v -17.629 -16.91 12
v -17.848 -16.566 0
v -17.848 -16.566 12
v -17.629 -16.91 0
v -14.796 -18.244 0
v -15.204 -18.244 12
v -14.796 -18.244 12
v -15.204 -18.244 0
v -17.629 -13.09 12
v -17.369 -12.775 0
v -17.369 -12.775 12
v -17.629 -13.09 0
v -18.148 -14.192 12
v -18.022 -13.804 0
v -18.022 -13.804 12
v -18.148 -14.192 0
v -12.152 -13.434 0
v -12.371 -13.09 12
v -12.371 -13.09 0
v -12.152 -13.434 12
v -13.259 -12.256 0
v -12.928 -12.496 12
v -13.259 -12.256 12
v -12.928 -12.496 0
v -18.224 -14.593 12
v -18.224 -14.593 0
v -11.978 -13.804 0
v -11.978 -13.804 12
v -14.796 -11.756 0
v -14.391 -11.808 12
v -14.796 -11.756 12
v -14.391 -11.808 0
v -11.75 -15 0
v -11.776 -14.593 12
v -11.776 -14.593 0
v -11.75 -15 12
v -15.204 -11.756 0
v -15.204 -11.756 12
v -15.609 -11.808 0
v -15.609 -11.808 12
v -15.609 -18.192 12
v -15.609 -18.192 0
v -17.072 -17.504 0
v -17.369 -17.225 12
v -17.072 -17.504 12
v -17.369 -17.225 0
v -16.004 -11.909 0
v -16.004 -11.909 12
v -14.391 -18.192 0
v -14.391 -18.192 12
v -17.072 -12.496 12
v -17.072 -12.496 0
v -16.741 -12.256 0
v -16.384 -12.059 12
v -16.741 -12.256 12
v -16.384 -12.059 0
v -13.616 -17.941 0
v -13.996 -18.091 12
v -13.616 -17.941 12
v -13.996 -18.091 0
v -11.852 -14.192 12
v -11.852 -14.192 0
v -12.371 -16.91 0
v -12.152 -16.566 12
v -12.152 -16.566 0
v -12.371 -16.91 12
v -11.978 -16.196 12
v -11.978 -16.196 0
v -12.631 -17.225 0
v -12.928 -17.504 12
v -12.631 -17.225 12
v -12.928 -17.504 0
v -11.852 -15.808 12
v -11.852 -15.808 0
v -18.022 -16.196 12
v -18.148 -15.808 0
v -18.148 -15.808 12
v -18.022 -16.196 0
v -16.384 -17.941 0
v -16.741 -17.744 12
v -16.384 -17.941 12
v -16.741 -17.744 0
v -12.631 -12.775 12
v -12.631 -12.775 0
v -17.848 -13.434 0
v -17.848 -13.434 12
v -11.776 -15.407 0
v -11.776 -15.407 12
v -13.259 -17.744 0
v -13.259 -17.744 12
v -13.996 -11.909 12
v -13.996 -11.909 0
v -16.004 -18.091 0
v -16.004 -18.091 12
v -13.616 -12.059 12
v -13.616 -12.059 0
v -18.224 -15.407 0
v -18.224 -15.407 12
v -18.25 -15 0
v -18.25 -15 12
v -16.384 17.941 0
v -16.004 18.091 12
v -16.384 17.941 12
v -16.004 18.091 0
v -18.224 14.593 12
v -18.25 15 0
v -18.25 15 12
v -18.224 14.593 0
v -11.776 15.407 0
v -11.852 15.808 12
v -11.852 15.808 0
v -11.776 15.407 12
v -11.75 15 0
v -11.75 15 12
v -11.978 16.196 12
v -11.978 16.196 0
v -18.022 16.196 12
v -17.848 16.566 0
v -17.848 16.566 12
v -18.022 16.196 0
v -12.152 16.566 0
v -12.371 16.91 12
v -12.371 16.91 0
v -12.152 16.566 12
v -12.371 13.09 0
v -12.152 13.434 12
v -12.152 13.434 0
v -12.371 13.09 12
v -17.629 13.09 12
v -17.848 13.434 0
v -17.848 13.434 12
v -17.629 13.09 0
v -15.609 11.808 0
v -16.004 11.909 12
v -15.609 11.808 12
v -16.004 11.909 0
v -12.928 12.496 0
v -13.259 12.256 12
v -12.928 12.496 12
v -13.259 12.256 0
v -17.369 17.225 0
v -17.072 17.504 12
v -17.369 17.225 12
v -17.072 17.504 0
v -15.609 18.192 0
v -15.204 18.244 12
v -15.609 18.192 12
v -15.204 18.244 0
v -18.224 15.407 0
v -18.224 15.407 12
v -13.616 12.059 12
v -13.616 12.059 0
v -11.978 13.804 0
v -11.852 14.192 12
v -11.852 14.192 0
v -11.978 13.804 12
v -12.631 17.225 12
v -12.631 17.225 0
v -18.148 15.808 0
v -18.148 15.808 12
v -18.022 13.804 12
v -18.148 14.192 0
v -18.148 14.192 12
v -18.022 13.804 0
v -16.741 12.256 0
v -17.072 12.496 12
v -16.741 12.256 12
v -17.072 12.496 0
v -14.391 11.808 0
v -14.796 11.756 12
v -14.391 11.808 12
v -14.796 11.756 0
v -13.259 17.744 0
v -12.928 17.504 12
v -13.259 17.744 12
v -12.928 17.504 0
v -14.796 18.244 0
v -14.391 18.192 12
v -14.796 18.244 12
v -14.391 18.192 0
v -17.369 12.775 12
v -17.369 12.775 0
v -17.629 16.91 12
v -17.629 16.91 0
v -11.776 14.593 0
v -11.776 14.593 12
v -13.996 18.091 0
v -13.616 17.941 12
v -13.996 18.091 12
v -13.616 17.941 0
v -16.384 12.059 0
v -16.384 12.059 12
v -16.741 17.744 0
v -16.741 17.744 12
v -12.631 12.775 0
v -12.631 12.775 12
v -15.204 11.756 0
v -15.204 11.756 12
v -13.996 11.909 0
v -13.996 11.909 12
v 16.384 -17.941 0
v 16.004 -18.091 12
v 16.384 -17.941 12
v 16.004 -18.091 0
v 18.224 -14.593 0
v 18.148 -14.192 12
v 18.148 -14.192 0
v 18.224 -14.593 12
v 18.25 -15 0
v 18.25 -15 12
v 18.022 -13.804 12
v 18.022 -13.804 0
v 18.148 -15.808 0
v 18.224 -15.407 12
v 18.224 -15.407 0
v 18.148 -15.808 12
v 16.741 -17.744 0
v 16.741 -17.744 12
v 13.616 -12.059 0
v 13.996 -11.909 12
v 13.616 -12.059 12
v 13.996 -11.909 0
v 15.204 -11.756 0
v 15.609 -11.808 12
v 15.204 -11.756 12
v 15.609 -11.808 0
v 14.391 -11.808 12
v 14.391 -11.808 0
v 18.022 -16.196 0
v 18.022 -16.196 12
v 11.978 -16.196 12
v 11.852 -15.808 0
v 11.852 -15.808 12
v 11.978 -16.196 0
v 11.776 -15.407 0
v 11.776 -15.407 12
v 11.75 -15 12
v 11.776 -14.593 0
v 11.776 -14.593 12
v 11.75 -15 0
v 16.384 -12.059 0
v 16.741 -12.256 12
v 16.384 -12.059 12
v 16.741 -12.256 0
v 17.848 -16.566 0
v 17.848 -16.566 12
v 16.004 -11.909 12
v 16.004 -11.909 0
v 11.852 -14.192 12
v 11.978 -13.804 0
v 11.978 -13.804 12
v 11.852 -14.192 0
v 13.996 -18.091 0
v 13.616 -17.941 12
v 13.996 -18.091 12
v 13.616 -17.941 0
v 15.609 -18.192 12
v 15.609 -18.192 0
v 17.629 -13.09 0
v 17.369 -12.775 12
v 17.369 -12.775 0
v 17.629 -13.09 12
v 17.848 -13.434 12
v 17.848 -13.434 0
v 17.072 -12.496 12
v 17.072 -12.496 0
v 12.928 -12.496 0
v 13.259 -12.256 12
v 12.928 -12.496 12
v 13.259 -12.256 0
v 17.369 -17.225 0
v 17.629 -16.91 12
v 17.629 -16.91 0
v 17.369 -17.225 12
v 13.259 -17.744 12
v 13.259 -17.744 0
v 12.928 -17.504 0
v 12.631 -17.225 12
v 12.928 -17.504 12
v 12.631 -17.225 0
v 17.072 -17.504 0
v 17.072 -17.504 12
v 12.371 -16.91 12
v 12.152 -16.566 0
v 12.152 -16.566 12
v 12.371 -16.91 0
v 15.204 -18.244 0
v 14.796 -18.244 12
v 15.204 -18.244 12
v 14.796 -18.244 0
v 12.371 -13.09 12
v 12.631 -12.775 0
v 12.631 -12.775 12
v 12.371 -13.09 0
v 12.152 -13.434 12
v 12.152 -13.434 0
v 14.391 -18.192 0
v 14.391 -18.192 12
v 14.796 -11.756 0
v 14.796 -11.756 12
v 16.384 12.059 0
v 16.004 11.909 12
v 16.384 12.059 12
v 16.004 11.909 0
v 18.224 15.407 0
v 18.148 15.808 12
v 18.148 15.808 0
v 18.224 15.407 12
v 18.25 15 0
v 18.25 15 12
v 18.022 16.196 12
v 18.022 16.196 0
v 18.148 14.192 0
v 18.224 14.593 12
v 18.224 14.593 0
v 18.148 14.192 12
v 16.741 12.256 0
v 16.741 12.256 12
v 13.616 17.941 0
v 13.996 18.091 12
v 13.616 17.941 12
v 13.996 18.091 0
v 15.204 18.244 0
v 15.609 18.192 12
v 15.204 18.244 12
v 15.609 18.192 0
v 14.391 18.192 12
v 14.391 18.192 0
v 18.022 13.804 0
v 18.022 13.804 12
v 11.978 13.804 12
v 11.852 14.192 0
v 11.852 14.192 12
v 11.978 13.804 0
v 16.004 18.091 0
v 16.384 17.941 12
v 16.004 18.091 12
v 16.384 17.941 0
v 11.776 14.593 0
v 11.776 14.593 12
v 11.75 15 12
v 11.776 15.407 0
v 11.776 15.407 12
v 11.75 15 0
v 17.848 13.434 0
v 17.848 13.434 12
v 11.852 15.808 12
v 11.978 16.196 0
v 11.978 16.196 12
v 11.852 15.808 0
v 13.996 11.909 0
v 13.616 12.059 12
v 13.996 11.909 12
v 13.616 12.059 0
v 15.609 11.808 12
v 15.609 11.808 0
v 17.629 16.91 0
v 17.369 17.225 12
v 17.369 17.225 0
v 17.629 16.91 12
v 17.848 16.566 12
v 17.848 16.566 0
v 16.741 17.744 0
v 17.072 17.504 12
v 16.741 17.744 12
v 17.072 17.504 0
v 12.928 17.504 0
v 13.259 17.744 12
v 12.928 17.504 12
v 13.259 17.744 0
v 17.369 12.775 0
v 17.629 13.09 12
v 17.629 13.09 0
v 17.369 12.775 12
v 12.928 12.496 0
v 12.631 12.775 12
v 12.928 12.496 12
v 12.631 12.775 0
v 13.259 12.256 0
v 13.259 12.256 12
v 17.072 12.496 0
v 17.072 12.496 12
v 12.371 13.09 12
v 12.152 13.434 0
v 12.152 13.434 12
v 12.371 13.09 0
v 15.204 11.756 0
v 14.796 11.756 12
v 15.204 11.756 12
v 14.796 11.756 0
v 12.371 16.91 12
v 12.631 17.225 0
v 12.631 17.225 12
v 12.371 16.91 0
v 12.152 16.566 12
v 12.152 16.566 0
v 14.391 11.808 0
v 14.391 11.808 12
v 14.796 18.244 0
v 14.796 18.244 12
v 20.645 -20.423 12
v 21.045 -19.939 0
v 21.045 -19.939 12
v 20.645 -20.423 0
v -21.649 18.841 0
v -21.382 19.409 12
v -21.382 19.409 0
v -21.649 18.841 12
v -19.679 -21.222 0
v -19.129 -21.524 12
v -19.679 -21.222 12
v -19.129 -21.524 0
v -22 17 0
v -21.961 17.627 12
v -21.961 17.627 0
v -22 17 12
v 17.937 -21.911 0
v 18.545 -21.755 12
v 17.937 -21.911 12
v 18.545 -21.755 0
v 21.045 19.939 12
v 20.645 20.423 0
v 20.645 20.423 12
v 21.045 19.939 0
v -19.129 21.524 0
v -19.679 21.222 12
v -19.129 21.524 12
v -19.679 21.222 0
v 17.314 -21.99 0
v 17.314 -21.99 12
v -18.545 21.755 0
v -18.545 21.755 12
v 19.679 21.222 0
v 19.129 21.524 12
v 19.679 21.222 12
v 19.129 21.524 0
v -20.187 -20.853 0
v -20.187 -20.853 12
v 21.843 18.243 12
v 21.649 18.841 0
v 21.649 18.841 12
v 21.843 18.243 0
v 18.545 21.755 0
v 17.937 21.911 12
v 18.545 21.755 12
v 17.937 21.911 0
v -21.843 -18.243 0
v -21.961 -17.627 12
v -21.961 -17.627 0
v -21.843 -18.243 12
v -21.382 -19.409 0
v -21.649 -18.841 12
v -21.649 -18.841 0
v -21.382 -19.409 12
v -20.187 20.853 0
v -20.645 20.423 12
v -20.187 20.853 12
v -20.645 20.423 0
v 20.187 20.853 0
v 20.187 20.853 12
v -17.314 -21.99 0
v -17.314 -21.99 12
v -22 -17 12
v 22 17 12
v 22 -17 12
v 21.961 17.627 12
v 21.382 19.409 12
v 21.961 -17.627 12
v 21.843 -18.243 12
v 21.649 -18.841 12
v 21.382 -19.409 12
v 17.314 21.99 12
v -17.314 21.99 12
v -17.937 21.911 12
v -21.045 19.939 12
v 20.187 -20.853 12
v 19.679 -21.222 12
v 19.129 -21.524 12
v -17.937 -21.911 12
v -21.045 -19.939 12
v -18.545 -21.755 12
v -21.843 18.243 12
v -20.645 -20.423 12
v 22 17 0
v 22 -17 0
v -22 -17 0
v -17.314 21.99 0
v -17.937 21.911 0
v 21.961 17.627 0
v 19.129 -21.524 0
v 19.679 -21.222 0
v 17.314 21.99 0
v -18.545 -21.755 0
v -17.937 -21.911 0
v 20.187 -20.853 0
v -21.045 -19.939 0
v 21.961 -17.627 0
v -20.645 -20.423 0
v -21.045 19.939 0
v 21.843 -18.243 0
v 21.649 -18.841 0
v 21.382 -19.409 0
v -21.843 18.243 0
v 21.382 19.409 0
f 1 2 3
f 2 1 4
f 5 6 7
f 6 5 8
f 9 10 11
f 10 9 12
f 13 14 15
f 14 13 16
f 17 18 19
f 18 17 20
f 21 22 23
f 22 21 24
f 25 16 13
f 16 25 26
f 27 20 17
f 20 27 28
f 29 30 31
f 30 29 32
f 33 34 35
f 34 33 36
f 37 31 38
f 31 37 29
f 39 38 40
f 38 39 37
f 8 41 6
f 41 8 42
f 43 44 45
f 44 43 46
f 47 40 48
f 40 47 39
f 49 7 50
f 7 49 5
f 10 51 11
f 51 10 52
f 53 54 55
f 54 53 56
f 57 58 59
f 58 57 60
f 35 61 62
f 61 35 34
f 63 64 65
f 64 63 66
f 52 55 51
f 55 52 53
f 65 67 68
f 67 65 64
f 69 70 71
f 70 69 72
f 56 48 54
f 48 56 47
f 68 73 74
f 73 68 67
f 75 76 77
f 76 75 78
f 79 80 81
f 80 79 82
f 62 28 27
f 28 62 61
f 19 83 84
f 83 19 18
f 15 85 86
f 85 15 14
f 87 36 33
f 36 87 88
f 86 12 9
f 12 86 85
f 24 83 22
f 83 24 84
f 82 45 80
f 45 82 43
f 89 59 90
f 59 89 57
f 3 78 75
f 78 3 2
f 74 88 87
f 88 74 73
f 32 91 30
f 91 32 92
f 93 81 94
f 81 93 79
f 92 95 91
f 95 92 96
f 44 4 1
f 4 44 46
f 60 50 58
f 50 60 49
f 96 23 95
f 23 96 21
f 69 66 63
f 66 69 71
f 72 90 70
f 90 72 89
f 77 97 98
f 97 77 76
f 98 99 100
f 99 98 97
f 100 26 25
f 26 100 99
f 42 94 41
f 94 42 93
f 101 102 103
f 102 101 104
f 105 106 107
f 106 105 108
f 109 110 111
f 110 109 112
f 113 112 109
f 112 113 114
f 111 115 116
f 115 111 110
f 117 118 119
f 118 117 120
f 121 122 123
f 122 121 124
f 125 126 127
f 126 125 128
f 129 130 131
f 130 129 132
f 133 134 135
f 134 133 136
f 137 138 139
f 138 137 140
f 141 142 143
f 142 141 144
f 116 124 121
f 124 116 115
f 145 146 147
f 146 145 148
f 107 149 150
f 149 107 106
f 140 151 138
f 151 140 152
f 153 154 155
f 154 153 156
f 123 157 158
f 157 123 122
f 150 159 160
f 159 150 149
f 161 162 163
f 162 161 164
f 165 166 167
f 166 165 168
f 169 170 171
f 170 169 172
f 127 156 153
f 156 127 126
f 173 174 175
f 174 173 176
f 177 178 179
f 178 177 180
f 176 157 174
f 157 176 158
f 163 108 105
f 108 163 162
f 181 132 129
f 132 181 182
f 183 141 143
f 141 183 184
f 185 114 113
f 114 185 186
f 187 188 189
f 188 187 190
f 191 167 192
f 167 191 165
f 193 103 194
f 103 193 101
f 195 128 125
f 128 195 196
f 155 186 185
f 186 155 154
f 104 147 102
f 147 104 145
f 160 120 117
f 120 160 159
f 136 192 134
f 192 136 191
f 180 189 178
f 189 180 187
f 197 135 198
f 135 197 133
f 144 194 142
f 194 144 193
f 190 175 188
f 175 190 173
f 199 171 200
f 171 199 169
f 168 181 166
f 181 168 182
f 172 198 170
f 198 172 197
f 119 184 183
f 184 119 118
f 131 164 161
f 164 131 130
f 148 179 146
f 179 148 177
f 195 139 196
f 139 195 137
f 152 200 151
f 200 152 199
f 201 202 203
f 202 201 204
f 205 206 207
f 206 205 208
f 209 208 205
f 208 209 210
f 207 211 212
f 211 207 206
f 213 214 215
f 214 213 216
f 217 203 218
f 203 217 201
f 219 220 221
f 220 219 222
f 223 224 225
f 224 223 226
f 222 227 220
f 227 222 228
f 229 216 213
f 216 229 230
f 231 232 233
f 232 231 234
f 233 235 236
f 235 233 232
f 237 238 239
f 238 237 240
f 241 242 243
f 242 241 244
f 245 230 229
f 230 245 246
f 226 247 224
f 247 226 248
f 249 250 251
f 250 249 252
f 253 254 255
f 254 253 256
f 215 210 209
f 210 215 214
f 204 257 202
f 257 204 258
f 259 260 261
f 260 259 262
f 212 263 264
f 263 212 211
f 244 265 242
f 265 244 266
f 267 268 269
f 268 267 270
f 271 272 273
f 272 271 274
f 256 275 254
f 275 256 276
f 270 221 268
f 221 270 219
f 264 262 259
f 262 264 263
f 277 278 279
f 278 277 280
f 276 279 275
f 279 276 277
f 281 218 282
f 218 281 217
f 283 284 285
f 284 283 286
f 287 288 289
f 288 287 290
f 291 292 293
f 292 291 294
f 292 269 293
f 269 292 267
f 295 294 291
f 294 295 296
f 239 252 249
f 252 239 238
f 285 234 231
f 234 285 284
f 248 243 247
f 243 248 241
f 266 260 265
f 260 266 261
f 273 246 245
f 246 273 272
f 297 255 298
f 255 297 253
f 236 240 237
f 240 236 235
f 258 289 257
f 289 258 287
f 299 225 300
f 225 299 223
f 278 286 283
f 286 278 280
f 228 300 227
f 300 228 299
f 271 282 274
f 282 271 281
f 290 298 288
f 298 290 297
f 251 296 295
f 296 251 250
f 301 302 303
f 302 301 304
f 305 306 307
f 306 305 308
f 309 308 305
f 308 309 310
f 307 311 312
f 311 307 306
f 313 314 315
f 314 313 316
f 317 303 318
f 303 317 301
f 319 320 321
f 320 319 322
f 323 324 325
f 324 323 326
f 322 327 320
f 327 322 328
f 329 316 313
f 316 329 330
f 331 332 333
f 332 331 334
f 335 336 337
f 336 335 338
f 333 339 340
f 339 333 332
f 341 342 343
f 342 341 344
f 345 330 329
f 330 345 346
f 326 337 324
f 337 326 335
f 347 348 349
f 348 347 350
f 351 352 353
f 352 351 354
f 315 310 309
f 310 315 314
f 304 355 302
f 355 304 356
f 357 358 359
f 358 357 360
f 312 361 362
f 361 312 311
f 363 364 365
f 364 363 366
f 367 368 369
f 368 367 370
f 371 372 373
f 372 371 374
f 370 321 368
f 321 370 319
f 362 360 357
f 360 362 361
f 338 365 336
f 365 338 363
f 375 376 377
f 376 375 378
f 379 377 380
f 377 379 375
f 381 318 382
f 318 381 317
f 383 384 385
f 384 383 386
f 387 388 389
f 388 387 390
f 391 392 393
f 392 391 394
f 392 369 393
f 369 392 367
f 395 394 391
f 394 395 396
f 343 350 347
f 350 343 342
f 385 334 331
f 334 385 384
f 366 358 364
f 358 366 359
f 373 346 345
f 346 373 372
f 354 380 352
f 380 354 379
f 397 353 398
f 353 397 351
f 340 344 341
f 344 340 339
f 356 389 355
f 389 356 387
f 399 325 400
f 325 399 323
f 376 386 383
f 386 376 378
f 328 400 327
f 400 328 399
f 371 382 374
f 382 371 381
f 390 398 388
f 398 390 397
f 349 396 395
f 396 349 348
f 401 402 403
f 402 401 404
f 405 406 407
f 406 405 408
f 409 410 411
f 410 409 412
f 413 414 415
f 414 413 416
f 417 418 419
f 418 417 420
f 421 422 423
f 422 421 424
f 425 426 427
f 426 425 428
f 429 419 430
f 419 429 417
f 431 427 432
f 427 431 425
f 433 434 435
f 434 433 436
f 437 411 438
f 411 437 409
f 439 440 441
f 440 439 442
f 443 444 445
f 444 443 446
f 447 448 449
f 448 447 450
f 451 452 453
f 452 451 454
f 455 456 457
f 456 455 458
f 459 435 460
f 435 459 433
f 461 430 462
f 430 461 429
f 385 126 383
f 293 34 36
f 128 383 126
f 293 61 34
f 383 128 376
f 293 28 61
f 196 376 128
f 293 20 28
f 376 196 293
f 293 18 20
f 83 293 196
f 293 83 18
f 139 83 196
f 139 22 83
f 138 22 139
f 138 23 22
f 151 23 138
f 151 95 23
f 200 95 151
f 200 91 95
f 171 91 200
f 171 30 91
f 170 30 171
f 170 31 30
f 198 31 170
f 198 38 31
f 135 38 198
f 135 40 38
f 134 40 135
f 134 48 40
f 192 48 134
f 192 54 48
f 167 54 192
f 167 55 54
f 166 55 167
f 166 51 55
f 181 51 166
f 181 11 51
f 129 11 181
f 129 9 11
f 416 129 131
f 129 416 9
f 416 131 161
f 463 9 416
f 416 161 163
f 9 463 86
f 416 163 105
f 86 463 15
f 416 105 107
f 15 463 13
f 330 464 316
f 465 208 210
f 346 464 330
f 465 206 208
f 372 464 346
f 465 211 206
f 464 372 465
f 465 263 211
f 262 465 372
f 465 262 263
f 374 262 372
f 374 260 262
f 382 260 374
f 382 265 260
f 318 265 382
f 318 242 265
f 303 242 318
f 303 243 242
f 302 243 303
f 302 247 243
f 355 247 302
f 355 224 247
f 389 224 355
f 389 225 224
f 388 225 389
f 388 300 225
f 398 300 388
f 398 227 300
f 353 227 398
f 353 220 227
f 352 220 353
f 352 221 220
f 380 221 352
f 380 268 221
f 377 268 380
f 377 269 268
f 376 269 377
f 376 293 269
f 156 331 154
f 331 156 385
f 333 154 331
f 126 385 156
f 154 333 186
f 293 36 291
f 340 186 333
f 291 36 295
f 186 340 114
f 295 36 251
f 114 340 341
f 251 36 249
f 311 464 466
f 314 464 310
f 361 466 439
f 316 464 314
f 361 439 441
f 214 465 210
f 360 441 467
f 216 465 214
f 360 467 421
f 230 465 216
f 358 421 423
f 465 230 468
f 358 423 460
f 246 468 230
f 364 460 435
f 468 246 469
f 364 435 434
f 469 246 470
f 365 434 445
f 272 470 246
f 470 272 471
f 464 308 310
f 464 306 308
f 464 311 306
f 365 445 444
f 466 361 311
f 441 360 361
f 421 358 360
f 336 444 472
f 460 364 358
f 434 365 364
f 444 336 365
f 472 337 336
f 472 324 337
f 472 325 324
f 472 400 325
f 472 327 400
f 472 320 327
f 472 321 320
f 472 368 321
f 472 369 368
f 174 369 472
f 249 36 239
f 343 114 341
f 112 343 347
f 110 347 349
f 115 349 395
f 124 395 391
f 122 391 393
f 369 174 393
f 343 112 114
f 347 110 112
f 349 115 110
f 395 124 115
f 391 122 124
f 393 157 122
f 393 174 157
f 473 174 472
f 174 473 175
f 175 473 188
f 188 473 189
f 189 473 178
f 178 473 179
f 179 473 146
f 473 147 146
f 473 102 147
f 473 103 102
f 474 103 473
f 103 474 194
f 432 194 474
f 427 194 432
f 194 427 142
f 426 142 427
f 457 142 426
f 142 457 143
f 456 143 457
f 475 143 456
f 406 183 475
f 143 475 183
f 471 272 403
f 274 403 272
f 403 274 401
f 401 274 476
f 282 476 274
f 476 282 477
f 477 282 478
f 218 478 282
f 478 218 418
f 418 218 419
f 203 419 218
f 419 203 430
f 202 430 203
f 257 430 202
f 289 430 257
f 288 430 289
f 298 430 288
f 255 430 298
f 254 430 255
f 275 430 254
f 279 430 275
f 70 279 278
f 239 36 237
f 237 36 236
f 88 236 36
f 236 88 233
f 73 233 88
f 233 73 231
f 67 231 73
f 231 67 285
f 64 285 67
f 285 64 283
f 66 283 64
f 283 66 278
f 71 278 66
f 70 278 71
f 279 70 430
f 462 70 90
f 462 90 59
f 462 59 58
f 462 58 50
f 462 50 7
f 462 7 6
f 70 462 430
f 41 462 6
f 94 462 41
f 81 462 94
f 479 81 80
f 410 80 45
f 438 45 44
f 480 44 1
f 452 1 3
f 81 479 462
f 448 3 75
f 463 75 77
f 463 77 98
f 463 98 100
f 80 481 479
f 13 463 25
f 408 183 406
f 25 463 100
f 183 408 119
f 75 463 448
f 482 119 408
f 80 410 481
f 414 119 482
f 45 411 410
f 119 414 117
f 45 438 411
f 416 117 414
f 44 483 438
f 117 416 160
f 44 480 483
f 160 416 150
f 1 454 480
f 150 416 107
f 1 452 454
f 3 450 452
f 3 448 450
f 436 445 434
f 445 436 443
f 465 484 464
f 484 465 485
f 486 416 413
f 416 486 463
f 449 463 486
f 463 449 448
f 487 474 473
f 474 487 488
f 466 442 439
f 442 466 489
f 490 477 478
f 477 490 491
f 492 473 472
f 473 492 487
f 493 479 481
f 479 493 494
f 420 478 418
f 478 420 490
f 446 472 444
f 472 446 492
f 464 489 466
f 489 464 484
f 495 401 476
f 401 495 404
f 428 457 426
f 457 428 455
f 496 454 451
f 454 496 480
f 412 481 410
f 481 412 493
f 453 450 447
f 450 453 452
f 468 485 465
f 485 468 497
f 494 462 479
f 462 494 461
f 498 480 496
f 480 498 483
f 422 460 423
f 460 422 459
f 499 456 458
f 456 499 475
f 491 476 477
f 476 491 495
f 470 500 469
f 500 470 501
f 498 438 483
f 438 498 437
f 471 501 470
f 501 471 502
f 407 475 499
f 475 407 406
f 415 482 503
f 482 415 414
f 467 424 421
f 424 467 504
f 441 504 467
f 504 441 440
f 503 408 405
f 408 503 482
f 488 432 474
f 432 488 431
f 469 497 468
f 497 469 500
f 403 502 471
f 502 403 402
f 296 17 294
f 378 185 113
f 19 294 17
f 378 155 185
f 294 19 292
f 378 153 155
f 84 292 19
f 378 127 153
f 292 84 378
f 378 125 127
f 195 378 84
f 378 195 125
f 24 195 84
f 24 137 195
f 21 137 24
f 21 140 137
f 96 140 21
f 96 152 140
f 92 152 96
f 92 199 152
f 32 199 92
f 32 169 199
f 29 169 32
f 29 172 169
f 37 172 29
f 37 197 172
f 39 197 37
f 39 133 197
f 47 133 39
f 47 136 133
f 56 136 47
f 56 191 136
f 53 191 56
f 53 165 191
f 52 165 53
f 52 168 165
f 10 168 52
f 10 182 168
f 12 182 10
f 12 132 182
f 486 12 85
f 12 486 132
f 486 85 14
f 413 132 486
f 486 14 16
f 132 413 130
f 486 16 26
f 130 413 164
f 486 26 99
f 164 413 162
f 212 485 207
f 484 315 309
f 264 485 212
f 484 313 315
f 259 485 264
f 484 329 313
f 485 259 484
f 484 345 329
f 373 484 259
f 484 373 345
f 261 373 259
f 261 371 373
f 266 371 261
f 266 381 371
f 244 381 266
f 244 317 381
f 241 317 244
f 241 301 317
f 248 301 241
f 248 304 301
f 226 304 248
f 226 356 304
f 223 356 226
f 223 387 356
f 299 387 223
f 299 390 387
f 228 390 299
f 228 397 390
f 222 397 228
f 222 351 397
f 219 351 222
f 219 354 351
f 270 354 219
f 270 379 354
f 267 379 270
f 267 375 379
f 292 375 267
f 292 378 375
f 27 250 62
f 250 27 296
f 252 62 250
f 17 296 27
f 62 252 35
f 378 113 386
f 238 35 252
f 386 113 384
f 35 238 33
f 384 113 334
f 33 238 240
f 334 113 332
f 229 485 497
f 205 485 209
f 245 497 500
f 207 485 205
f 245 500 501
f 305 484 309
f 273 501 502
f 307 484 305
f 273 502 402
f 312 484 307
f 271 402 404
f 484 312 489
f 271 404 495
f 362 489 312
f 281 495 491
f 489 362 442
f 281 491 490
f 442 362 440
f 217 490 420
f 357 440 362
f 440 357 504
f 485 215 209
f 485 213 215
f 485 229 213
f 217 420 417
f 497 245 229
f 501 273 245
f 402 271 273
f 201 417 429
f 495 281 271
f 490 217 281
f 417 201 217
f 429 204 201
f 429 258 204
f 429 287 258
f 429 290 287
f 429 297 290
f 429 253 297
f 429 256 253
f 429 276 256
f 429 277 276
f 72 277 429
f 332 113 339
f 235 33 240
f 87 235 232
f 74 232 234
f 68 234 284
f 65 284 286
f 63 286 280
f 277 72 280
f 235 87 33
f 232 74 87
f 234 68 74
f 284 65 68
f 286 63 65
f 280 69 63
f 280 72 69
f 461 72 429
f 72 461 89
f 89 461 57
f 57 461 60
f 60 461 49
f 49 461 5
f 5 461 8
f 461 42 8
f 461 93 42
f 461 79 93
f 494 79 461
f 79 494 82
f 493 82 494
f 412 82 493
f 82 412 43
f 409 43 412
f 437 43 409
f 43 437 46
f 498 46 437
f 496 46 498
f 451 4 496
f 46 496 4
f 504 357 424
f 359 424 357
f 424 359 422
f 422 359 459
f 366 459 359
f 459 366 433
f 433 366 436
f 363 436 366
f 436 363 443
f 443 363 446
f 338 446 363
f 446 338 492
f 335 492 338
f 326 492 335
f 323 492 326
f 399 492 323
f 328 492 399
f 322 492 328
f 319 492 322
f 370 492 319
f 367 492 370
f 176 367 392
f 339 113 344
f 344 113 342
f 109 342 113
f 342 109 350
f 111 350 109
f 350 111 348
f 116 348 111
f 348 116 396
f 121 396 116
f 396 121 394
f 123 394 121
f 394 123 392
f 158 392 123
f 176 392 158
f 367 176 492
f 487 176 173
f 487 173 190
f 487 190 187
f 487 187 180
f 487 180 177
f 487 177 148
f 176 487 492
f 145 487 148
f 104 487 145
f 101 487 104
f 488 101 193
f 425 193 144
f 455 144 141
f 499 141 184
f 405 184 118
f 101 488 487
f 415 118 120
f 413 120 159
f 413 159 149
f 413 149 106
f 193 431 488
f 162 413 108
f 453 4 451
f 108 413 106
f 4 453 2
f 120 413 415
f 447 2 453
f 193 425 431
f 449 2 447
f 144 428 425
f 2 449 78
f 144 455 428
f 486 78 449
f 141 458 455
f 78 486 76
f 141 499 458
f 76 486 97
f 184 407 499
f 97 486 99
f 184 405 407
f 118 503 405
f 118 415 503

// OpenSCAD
$fn = 50;


difference() {
	union() {
		hull() {
			translate(v = [-17.0000000000, 17.0000000000, 0]) {
				cylinder(h = 12, r = 5);
			}
			translate(v = [17.0000000000, 17.0000000000, 0]) {
				cylinder(h = 12, r = 5);
			}
			translate(v = [-17.0000000000, -17.0000000000, 0]) {
				cylinder(h = 12, r = 5);
			}
			translate(v = [17.0000000000, -17.0000000000, 0]) {
				cylinder(h = 12, r = 5);
			}
		}
	}
	union() {
		translate(v = [-15.0000000000, -15.0000000000, -100.0000000000]) {
			cylinder(h = 200, r = 3.2500000000);
		}
		translate(v = [-15.0000000000, 15.0000000000, -100.0000000000]) {
			cylinder(h = 200, r = 3.2500000000);
		}
		translate(v = [15.0000000000, -15.0000000000, -100.0000000000]) {
			cylinder(h = 200, r = 3.2500000000);
		}
		translate(v = [15.0000000000, 15.0000000000, -100.0000000000]) {
			cylinder(h = 200, r = 3.2500000000);
		}
	}
}
